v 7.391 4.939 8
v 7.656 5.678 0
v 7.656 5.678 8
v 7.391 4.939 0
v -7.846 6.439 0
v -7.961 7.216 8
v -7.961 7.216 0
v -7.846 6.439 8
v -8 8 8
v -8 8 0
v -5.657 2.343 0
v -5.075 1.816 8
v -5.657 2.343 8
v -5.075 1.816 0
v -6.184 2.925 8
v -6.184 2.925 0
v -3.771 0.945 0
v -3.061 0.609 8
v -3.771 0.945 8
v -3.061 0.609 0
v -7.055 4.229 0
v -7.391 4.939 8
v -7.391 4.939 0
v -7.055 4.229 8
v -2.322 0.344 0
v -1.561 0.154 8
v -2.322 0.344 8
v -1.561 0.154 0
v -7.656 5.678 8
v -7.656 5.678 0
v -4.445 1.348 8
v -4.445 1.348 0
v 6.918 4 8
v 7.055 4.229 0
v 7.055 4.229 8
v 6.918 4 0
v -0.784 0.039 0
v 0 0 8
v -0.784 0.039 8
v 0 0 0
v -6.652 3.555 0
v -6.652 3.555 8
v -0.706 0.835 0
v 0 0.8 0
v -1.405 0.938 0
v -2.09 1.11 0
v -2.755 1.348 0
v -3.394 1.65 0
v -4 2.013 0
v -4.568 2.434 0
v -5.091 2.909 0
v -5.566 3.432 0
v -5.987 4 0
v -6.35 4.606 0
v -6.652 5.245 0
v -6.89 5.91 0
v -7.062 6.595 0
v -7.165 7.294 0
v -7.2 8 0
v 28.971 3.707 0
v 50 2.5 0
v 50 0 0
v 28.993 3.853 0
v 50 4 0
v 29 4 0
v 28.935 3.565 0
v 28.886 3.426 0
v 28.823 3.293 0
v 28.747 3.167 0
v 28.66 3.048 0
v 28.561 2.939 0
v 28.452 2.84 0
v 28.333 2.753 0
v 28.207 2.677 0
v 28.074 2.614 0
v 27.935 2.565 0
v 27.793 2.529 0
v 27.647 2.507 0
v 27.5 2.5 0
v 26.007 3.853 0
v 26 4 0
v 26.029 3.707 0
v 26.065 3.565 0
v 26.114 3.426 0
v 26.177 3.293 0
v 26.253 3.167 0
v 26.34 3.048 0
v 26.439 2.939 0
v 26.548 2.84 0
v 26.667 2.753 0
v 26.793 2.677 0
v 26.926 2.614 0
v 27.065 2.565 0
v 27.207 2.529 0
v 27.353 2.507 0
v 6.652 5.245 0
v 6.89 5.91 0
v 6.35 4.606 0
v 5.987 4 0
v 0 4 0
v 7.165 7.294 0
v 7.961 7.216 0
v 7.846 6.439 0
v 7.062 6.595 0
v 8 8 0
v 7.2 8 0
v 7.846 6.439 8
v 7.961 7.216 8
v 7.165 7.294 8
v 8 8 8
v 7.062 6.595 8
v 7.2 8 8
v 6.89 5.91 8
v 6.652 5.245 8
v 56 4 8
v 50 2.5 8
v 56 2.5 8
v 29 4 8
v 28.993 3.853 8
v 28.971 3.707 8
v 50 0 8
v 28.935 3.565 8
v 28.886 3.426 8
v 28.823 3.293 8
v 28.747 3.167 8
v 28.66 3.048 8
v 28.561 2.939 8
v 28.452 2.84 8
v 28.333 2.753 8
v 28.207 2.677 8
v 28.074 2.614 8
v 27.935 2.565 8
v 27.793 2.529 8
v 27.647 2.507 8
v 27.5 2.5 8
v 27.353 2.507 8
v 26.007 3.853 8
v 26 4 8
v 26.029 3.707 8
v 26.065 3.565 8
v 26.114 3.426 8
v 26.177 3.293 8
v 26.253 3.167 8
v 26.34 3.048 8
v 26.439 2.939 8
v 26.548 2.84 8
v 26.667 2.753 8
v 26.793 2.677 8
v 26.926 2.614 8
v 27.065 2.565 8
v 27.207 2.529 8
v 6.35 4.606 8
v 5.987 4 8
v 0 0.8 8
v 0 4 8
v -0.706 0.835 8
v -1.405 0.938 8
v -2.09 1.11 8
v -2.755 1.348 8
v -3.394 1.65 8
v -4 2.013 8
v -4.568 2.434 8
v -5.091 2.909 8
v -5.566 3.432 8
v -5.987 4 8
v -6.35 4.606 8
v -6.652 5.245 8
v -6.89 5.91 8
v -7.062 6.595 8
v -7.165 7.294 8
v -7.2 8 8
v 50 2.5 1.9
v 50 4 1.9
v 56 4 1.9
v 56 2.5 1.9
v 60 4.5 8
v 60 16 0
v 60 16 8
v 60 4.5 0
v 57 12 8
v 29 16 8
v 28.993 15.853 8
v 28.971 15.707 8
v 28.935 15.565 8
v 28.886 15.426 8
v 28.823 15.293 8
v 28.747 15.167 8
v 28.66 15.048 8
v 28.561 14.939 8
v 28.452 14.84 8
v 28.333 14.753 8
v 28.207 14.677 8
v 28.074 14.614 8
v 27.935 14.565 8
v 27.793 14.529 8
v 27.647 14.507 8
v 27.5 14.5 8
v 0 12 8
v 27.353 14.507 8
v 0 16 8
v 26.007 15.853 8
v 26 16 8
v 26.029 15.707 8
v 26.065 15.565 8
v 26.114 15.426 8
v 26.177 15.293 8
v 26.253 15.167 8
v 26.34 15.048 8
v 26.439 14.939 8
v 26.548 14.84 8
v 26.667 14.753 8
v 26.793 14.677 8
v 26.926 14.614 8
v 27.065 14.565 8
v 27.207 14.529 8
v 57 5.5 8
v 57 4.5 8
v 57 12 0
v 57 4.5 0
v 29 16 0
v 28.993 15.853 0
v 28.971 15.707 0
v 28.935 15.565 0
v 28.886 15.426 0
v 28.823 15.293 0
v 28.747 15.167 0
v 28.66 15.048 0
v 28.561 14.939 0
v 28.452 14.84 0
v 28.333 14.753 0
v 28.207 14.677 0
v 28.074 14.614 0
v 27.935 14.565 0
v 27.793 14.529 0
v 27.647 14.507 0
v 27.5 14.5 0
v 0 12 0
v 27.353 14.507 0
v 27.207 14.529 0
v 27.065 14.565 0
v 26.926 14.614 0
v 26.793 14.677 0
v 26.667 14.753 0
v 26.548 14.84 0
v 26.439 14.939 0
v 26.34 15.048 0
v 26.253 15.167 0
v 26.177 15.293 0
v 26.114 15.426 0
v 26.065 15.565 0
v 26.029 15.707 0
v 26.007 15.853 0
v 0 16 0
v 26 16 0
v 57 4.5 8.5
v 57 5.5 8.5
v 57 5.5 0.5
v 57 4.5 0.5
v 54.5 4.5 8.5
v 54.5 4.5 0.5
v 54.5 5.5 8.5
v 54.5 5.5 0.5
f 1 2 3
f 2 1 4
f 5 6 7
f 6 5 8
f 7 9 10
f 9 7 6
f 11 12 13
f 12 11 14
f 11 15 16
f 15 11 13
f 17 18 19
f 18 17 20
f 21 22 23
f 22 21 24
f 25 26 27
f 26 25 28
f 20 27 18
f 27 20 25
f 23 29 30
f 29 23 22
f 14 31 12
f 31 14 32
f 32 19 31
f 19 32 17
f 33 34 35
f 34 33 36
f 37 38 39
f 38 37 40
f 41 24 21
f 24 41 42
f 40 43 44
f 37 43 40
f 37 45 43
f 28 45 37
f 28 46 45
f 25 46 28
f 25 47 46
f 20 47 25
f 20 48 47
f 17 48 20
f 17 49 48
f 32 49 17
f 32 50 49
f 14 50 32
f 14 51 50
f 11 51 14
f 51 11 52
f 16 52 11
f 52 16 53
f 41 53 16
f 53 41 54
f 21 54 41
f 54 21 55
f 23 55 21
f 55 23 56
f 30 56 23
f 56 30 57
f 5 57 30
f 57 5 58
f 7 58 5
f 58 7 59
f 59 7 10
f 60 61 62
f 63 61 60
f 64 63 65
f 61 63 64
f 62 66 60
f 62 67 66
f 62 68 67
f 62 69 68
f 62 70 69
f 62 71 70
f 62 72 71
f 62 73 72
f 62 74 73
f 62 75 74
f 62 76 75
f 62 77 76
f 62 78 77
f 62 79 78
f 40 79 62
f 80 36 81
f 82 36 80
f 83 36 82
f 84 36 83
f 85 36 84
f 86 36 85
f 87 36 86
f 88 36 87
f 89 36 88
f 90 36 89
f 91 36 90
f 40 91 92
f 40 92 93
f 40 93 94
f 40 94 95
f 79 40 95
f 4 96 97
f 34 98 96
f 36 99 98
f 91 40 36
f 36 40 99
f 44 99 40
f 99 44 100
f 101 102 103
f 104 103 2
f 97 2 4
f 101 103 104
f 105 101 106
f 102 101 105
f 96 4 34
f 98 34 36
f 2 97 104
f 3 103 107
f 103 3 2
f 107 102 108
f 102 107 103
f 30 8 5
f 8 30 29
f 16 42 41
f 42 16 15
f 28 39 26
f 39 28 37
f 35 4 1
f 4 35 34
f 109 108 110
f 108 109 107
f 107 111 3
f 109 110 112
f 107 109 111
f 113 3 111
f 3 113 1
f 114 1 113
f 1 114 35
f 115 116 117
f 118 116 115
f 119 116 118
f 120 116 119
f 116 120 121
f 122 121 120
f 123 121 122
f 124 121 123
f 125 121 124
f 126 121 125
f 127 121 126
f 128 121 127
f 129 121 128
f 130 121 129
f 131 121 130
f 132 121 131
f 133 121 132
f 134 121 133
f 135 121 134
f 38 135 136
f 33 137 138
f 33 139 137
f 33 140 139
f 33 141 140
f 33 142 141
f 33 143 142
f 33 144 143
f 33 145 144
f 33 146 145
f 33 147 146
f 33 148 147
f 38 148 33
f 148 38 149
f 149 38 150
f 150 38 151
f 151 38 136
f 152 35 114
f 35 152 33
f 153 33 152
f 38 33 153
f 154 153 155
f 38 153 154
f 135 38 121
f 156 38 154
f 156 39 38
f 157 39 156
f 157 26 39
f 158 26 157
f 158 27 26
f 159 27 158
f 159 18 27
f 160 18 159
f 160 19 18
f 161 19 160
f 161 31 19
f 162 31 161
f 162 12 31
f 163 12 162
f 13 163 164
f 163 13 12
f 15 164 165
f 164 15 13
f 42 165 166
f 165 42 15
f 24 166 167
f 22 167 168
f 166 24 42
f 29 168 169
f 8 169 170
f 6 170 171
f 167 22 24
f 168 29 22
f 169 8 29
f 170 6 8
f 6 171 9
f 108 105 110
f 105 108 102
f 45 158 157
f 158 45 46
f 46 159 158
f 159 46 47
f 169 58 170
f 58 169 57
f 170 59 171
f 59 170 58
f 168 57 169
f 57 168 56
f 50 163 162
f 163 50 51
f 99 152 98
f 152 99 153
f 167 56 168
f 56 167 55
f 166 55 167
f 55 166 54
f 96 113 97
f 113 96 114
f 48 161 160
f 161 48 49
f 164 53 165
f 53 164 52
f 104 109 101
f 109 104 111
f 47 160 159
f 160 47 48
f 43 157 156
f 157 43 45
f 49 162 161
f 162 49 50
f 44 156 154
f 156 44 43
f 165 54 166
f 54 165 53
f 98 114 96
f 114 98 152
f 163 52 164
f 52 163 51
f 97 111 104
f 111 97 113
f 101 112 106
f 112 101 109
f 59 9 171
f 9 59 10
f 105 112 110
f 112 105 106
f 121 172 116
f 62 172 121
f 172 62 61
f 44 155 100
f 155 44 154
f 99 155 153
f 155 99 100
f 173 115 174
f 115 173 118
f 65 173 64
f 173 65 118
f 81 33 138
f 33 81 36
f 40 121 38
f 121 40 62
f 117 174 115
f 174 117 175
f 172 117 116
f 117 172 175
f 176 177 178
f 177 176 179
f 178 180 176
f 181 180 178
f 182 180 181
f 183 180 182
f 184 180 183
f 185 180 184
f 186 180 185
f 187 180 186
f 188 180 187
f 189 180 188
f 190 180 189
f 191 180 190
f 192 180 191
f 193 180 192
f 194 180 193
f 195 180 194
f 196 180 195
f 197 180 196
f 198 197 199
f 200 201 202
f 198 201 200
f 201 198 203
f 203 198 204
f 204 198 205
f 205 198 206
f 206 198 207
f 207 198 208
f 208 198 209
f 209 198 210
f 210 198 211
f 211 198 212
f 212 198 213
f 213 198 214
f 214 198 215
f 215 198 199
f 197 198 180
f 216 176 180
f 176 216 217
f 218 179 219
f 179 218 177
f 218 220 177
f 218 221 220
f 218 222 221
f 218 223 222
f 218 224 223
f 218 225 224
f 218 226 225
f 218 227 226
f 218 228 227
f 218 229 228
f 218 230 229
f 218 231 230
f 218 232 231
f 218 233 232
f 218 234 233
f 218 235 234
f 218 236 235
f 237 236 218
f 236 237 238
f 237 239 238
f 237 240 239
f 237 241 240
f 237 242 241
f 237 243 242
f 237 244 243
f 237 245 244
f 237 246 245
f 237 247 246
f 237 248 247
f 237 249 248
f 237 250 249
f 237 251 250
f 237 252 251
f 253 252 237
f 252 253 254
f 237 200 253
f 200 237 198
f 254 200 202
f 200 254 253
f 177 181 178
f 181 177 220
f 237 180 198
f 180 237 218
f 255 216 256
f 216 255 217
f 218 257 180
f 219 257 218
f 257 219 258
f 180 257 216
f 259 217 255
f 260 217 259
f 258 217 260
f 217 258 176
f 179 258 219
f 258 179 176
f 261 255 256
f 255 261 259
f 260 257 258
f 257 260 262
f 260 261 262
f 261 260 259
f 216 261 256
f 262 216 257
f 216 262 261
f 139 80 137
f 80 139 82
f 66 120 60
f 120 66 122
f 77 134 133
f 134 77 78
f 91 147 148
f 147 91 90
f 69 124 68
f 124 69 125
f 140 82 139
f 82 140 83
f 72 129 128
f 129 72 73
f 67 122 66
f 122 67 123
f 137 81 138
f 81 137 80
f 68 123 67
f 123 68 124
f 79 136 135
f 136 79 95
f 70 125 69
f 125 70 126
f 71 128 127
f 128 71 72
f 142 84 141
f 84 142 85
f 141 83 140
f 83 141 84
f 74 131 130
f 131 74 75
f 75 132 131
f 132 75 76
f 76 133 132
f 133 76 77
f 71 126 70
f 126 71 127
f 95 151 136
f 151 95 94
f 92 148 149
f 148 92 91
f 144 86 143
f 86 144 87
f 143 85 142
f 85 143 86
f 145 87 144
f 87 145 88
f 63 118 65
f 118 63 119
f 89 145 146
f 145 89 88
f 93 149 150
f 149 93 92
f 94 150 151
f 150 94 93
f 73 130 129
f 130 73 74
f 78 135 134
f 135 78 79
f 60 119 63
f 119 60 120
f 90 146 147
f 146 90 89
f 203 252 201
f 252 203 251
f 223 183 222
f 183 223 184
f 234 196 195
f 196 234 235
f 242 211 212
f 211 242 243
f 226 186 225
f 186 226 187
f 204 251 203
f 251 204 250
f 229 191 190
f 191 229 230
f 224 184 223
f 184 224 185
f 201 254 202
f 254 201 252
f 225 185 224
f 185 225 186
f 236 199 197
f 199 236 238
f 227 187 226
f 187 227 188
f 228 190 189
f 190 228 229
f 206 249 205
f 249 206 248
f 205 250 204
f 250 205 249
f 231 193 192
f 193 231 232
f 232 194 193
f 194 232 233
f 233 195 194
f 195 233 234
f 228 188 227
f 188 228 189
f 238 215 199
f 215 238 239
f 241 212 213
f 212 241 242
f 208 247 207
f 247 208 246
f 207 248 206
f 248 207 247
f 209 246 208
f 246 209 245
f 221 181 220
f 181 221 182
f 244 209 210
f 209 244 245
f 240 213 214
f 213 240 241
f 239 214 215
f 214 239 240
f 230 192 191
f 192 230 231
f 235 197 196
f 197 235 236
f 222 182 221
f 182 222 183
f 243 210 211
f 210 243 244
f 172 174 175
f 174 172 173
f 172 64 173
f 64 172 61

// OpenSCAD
// --- Parameters ---
// Dimensions in mm
thickness = 8;               // Extrusion depth along Z
lower_bar_len = 50;          // Length of lower bar
lower_bar_width = 4;         // Width of lower bar
lower_tongue_len = 6;         // Length of lower tongue (50 to 56)
lower_tongue_width = 1.5;    // Width of lower tongue (4 - 2.5 = 1.5)
lower_tongue_start_y = 2.5; // Y-offset for tongue

upper_bar_len = 60;          // Length of upper bar
upper_bar_width = 4;         // Width of upper bar
upper_bar_y_start = 12;      // Y-position of upper bar start
upper_bar_y_end = 16;        // Y-position of upper bar end

hinge_radius_inner = 7.2;    // Inner radius of hinge
hinge_radius_outer = 8.0;    // Outer radius of hinge
hinge_center_x = 0;          // X-center of hinge
hinge_center_y = 8;          // Y-center of hinge

pinch_ridge_radius = 1.5;    // Radius of the half-round ridge
pinch_ridge_x = 27.5;        // X-position of the ridge

latch_leg_x_start = 57;       // Start of latch leg
latch_leg_x_end = 60;         // End of latch leg
latch_leg_y_start = 4.5;      // Start of latch leg Y
latch_leg_y_end = 12;        // End of latch leg Y

latch_nose_x_start = 54.5;    // Start of latch nose
latch_nose_x_end = 57;        // End of latch nose
latch_nose_y_start = 4.5;     // Start of latch nose Y
latch_nose_y_end = 5.5;       // End of latch nose Y
latch_nose_z_offset = 0.5;    // Z-offset for the nose relative to the tongue

$fn = 64;

// --- Construction ---

module pinch_clamp() {
    difference() {
        union() {
            // 1. Lower Jaw Bar
            cube([lower_bar_len, lower_bar_width, thickness]);
            
            // 2. Lower Jaw Tongue
            translate([lower_bar_len, lower_tongue_start_y, 0])
                cube([lower_tongue_len, lower_tongue_width, thickness]);
            
            // 3. Upper Jaw Bar
            translate([0, upper_bar_y_start, 0])
                cube([upper_bar_len, upper_bar_width, thickness]);
            
            // 4. Hinge (Half-ring on the left)
            translate([hinge_center_x, hinge_center_y, 0])
                rotate([0, 0, 180]) // Orient half-ring to face left
                difference() {
                    cylinder(r = hinge_radius_outer, h = thickness);
                    cylinder(r = hinge_radius_inner, h = thickness + 0.1);
                    // Cut the half-ring to make it a semi-circle
                    translate([-hinge_radius_outer, -hinge_radius_outer, -0.5])
                        cube([hinge_radius_outer * 2, hinge_radius_outer, thickness + 1]);
                }
            
            // 5. Latch Leg
            translate([latch_leg_x_start, latch_leg_y_start, 0])
                cube([latch_leg_x_end - latch_leg_x_start, latch_leg_y_end - latch_leg_y_start, thickness]);
            
            // 6. Latch Nose (The part that snaps)
            // Note: The prompt specifies the nose is 0.5mm above the tongue.
            // Since we are extruding the 2D profile 8mm along Z, 
            // we treat the "above" as a Z-offset in the 3D model.
            translate([latch_nose_x_start, latch_nose_y_start, latch_nose_z_offset])
                cube([latch_nose_x_end - latch_nose_x_start, latch_nose_y_end - latch_nose_y_start, thickness]);
        }

        // --- Subtraction (Cuts) ---

        // 7. Lower Pinch Ridge (Half-round cut into the inner face)
        translate([pinch_ridge_x, lower_bar_width, 0])
            rotate([0, 0, 90])
            cylinder(r = pinch_ridge_radius, h = thickness + 2);
        
        // 8. Upper Pinch Ridge (Half-round cut into the inner face)
        translate([pinch_ridge_x, upper_bar_y_end, 0])
            rotate([0, 0, 90])
            cylinder(r = pinch_ridge_radius, h = thickness + 2);

        // 9. Clearance for the latch nose to snap under the tongue
        // We create a small notch in the underside of the tongue area 
        // to allow the nose to engage/disengage.
        translate([50, 2.5, -0.1])
            cube([6, 1.5, 2]); 

    }
}

// Render the part
pinch_clamp();
